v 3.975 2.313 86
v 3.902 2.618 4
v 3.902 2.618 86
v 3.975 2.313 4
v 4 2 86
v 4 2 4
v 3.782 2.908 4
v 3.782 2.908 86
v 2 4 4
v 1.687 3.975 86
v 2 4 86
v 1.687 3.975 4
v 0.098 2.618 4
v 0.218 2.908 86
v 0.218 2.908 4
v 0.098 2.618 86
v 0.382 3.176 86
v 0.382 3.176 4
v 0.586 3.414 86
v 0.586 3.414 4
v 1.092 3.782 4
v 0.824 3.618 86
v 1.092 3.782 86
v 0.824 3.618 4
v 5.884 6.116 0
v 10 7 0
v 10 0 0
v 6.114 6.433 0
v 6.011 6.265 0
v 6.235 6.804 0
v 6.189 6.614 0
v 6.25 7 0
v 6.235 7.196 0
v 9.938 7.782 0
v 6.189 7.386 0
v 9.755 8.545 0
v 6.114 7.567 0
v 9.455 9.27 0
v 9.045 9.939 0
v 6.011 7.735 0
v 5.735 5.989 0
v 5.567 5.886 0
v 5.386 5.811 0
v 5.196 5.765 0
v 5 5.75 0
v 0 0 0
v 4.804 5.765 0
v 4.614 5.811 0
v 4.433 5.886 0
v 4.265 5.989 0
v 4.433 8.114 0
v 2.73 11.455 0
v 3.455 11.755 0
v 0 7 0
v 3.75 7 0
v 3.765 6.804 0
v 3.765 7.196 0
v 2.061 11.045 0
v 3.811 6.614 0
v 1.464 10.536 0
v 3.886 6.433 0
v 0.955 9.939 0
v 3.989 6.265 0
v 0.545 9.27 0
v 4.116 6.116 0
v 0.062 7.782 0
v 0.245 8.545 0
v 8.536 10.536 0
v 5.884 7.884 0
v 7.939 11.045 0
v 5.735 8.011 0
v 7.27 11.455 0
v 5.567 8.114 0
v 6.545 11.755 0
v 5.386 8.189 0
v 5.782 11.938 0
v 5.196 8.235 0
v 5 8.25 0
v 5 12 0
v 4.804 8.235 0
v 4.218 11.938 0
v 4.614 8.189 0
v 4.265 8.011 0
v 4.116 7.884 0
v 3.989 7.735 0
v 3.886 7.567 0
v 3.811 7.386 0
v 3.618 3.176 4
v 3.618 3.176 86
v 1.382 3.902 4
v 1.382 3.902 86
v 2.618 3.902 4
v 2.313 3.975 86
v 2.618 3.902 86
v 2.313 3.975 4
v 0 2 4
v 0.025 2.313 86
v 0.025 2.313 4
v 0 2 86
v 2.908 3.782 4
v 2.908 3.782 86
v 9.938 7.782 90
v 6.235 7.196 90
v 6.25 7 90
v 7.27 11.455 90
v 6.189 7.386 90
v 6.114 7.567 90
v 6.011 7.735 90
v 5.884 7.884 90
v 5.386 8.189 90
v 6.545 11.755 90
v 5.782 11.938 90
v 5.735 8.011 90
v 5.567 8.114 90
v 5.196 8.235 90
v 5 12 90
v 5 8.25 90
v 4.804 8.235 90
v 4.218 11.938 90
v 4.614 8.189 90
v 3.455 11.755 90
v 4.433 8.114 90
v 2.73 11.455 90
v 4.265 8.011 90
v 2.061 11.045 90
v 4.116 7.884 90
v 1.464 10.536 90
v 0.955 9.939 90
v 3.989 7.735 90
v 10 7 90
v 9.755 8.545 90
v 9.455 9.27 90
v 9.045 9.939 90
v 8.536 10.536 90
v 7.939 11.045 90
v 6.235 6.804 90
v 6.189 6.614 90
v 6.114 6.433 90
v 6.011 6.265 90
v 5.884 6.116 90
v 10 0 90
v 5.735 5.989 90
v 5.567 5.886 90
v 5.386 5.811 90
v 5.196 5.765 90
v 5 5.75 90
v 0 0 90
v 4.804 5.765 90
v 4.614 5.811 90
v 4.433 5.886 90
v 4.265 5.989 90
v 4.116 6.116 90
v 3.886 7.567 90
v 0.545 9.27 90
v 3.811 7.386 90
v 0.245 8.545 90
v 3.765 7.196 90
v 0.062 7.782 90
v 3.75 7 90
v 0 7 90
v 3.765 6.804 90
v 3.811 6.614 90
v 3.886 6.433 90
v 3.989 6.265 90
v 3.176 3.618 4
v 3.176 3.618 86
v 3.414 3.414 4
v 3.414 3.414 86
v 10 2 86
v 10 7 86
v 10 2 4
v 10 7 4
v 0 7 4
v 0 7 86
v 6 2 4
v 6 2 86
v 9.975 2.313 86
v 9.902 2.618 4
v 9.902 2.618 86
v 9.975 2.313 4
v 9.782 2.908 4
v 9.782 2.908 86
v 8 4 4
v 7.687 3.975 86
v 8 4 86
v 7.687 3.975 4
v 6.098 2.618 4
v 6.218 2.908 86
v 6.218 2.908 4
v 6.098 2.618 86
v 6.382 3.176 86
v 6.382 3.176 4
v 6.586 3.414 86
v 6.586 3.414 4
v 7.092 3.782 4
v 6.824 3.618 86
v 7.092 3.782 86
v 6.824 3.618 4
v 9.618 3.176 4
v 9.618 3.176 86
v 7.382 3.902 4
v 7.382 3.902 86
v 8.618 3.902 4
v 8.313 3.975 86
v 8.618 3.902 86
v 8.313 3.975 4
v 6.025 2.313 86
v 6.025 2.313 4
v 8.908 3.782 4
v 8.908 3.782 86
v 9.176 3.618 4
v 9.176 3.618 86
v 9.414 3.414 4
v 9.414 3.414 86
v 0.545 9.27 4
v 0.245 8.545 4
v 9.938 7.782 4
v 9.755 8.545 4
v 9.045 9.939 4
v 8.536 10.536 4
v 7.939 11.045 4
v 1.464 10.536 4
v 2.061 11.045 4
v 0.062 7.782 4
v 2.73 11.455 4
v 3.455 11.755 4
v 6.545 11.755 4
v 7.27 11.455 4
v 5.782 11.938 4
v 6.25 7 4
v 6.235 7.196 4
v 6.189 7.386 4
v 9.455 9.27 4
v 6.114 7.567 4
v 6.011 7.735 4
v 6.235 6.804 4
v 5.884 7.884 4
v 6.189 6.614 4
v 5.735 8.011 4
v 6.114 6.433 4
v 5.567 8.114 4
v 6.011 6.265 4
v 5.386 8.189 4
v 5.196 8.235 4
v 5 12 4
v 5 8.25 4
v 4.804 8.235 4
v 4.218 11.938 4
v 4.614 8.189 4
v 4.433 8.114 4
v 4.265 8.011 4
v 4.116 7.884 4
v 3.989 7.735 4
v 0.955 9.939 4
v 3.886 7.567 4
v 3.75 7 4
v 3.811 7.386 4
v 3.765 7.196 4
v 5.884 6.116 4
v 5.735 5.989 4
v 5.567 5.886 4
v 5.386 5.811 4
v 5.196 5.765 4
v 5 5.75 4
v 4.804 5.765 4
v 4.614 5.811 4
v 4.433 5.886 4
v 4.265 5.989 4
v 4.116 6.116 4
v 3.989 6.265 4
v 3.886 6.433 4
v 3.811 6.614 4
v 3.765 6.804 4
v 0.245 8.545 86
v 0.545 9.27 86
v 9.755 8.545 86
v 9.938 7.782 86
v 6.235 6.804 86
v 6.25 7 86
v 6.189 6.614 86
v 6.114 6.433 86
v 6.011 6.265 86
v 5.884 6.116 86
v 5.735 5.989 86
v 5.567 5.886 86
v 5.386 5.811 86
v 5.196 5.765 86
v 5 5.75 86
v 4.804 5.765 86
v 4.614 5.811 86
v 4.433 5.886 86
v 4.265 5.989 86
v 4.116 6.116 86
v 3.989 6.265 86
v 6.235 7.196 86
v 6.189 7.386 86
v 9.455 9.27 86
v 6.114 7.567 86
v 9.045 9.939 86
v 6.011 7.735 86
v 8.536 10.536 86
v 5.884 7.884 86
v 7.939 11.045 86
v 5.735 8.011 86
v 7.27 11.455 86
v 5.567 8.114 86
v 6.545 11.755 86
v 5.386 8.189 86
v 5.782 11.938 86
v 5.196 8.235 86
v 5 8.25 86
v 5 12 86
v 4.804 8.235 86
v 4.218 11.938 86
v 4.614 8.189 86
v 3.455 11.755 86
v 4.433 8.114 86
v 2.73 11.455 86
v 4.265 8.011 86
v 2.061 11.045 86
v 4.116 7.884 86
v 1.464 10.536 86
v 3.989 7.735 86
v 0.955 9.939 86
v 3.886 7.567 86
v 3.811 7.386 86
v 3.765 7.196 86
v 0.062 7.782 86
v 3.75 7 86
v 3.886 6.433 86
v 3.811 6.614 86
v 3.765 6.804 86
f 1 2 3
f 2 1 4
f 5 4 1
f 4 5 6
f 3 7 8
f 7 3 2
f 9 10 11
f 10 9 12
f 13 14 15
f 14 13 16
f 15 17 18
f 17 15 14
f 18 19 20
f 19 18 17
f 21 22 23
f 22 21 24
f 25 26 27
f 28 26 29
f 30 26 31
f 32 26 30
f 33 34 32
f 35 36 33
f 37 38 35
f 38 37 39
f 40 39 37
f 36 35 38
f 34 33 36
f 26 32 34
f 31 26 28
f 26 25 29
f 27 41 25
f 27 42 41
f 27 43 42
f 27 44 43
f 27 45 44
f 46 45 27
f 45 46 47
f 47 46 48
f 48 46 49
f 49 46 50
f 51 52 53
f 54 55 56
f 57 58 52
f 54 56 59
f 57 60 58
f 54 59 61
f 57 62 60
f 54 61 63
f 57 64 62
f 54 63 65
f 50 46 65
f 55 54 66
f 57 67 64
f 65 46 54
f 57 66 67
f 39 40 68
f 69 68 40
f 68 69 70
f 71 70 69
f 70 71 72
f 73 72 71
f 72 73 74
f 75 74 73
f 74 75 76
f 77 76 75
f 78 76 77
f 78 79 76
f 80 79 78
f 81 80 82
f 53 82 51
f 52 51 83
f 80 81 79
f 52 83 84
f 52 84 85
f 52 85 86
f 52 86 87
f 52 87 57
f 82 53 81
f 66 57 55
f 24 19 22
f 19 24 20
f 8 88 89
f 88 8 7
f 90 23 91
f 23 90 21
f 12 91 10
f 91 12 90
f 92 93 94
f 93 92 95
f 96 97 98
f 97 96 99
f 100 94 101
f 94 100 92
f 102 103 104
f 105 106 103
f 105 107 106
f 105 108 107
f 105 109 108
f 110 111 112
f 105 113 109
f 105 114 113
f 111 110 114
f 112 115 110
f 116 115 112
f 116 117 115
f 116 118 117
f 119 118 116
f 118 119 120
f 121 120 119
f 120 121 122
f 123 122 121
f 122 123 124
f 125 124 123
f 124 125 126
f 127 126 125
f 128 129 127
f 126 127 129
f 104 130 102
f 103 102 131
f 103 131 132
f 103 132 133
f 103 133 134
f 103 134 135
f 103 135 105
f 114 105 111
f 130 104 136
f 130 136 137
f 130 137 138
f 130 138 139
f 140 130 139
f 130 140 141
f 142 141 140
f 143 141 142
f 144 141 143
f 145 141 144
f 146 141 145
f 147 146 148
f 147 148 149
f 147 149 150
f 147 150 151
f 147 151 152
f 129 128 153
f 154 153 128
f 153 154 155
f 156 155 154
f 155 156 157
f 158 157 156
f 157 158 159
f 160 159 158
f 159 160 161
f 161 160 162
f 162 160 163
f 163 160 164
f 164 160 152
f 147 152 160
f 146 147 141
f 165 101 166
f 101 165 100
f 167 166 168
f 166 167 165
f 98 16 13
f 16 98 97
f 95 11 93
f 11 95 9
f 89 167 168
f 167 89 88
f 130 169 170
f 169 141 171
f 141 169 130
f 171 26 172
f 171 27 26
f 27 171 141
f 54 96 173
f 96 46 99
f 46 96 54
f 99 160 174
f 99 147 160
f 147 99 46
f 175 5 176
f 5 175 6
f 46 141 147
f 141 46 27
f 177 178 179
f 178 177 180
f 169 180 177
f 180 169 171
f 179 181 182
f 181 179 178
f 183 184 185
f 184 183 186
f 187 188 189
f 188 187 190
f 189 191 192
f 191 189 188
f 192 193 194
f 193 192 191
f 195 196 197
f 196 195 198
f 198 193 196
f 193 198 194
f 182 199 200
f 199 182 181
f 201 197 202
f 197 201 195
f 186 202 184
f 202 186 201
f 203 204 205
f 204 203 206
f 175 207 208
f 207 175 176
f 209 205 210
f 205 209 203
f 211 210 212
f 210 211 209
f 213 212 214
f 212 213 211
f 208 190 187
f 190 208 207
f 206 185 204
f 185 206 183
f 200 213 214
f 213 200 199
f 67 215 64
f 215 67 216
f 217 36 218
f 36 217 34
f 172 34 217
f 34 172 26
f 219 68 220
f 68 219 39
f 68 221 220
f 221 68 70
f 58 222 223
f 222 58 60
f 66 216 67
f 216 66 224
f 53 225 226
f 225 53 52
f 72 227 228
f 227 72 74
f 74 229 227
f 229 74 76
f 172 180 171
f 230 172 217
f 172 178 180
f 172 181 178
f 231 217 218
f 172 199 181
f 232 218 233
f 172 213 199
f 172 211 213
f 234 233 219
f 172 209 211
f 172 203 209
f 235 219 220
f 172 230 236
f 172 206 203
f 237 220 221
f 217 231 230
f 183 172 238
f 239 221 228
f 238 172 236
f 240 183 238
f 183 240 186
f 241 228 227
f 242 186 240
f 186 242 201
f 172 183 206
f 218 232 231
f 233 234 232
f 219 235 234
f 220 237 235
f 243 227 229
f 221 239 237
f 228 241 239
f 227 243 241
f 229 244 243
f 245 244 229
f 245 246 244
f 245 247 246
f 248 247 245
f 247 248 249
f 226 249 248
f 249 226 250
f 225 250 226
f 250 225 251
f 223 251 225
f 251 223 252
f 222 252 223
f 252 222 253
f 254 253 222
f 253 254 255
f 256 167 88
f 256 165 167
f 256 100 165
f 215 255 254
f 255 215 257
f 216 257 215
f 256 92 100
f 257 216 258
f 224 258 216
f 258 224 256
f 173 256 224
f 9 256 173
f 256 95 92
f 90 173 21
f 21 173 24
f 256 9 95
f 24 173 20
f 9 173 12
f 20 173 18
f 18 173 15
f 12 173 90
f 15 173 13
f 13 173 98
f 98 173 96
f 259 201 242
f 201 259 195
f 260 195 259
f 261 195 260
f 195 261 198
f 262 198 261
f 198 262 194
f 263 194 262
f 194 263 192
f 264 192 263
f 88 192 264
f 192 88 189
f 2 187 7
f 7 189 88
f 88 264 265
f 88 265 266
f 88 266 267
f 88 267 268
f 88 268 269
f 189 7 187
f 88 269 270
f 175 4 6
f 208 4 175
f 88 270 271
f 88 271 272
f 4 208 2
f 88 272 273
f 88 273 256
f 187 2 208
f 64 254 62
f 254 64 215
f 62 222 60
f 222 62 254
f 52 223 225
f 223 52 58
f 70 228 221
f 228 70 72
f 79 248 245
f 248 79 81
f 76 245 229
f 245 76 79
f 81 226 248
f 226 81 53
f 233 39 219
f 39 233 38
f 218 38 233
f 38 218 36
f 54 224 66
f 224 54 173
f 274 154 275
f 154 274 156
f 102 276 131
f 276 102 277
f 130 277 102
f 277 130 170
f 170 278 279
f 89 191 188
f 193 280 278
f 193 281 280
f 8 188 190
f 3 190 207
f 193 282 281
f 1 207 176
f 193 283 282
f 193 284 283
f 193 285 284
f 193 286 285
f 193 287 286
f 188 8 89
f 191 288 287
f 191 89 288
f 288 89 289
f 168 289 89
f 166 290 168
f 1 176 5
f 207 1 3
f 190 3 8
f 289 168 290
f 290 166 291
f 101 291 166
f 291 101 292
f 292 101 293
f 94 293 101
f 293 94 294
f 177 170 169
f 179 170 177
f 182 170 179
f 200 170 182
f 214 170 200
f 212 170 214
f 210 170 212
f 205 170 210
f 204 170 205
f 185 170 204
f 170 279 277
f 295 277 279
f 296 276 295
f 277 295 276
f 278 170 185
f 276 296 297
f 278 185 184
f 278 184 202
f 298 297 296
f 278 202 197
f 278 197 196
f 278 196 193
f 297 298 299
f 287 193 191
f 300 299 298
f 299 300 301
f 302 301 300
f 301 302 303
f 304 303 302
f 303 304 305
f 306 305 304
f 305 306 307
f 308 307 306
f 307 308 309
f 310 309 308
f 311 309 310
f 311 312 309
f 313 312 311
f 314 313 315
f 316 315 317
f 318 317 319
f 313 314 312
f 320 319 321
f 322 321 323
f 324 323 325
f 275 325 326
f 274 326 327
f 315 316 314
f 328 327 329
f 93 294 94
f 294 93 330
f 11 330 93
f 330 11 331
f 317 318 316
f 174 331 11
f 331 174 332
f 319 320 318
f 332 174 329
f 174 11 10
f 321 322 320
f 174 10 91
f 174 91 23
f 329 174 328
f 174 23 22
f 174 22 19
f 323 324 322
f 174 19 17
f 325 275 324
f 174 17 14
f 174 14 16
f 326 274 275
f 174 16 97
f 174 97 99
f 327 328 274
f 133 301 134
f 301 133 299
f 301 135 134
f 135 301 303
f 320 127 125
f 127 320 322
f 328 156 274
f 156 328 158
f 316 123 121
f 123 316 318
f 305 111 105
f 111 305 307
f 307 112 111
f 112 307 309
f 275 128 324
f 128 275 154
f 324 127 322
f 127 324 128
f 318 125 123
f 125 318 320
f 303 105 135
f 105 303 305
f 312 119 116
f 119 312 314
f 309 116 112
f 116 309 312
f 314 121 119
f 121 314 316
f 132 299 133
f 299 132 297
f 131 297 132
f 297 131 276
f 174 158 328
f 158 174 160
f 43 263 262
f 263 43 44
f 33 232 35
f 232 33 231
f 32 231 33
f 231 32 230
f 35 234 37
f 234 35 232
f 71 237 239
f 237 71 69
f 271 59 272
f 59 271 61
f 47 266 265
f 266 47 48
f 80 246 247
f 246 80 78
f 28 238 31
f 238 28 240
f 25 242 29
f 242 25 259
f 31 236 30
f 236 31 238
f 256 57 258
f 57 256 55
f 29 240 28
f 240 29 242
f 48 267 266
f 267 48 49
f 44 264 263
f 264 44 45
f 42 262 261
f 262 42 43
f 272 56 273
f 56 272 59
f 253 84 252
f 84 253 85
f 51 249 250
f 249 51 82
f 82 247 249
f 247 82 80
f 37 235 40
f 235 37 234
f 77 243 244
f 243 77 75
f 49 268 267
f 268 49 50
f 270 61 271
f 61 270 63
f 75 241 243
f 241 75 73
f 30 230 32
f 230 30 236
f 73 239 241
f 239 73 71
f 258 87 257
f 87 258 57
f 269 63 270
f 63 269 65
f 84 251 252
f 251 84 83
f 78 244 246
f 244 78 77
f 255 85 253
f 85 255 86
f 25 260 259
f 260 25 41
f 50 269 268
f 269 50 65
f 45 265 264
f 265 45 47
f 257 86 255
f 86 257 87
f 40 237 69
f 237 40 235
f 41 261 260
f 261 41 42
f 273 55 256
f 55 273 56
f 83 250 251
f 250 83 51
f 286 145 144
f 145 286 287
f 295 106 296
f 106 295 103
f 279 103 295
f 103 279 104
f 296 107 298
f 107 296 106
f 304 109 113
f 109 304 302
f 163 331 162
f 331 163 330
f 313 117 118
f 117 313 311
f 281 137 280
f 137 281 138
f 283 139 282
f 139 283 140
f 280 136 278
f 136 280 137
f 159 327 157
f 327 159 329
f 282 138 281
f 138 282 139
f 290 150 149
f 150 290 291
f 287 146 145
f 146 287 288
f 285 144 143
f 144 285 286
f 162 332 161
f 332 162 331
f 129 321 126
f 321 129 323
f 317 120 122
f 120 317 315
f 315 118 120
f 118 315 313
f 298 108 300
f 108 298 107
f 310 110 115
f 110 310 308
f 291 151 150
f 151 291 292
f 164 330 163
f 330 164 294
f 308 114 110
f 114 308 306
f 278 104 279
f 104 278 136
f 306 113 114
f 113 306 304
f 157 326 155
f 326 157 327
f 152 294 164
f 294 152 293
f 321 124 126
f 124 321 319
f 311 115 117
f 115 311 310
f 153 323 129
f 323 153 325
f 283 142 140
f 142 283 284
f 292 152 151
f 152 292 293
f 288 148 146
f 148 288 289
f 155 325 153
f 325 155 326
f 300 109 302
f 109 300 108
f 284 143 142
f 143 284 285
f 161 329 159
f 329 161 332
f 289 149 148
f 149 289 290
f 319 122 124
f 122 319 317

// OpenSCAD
$fn=40;

beam();

module beam(){{
    difference(){
    union(){
    translate([2,2,0])cylinder(d=4,h=90);
    translate([0,0,0])cube([10,2,90]);
        translate([8,2,0])cylinder(d=4,h=90);
    //translate([0,2,0])cube([2,8,90]);
        
    translate([5,7,0])cylinder(d=10,h=4);
    translate([0,2,0])cube([10,5,4]);
    //translate([2,2,0])cube([3,8,4]);
        

        
 //   translate([5,5,32])cylinder(d=10,h=32);
//    translate([2,2,32])cube([8,3,32]);
//    translate([2,2,32])cube([3,8,32]);    
        
    translate([5,7,86])cylinder(d=10,h=4);
    translate([0,2,86])cube([10,5,4]);  
        
    }
    translate([5,7,0])cylinder(d=2.5,h=10);
    translate([5,7,85])cylinder(d=2.5,h=10);
}
}
}
